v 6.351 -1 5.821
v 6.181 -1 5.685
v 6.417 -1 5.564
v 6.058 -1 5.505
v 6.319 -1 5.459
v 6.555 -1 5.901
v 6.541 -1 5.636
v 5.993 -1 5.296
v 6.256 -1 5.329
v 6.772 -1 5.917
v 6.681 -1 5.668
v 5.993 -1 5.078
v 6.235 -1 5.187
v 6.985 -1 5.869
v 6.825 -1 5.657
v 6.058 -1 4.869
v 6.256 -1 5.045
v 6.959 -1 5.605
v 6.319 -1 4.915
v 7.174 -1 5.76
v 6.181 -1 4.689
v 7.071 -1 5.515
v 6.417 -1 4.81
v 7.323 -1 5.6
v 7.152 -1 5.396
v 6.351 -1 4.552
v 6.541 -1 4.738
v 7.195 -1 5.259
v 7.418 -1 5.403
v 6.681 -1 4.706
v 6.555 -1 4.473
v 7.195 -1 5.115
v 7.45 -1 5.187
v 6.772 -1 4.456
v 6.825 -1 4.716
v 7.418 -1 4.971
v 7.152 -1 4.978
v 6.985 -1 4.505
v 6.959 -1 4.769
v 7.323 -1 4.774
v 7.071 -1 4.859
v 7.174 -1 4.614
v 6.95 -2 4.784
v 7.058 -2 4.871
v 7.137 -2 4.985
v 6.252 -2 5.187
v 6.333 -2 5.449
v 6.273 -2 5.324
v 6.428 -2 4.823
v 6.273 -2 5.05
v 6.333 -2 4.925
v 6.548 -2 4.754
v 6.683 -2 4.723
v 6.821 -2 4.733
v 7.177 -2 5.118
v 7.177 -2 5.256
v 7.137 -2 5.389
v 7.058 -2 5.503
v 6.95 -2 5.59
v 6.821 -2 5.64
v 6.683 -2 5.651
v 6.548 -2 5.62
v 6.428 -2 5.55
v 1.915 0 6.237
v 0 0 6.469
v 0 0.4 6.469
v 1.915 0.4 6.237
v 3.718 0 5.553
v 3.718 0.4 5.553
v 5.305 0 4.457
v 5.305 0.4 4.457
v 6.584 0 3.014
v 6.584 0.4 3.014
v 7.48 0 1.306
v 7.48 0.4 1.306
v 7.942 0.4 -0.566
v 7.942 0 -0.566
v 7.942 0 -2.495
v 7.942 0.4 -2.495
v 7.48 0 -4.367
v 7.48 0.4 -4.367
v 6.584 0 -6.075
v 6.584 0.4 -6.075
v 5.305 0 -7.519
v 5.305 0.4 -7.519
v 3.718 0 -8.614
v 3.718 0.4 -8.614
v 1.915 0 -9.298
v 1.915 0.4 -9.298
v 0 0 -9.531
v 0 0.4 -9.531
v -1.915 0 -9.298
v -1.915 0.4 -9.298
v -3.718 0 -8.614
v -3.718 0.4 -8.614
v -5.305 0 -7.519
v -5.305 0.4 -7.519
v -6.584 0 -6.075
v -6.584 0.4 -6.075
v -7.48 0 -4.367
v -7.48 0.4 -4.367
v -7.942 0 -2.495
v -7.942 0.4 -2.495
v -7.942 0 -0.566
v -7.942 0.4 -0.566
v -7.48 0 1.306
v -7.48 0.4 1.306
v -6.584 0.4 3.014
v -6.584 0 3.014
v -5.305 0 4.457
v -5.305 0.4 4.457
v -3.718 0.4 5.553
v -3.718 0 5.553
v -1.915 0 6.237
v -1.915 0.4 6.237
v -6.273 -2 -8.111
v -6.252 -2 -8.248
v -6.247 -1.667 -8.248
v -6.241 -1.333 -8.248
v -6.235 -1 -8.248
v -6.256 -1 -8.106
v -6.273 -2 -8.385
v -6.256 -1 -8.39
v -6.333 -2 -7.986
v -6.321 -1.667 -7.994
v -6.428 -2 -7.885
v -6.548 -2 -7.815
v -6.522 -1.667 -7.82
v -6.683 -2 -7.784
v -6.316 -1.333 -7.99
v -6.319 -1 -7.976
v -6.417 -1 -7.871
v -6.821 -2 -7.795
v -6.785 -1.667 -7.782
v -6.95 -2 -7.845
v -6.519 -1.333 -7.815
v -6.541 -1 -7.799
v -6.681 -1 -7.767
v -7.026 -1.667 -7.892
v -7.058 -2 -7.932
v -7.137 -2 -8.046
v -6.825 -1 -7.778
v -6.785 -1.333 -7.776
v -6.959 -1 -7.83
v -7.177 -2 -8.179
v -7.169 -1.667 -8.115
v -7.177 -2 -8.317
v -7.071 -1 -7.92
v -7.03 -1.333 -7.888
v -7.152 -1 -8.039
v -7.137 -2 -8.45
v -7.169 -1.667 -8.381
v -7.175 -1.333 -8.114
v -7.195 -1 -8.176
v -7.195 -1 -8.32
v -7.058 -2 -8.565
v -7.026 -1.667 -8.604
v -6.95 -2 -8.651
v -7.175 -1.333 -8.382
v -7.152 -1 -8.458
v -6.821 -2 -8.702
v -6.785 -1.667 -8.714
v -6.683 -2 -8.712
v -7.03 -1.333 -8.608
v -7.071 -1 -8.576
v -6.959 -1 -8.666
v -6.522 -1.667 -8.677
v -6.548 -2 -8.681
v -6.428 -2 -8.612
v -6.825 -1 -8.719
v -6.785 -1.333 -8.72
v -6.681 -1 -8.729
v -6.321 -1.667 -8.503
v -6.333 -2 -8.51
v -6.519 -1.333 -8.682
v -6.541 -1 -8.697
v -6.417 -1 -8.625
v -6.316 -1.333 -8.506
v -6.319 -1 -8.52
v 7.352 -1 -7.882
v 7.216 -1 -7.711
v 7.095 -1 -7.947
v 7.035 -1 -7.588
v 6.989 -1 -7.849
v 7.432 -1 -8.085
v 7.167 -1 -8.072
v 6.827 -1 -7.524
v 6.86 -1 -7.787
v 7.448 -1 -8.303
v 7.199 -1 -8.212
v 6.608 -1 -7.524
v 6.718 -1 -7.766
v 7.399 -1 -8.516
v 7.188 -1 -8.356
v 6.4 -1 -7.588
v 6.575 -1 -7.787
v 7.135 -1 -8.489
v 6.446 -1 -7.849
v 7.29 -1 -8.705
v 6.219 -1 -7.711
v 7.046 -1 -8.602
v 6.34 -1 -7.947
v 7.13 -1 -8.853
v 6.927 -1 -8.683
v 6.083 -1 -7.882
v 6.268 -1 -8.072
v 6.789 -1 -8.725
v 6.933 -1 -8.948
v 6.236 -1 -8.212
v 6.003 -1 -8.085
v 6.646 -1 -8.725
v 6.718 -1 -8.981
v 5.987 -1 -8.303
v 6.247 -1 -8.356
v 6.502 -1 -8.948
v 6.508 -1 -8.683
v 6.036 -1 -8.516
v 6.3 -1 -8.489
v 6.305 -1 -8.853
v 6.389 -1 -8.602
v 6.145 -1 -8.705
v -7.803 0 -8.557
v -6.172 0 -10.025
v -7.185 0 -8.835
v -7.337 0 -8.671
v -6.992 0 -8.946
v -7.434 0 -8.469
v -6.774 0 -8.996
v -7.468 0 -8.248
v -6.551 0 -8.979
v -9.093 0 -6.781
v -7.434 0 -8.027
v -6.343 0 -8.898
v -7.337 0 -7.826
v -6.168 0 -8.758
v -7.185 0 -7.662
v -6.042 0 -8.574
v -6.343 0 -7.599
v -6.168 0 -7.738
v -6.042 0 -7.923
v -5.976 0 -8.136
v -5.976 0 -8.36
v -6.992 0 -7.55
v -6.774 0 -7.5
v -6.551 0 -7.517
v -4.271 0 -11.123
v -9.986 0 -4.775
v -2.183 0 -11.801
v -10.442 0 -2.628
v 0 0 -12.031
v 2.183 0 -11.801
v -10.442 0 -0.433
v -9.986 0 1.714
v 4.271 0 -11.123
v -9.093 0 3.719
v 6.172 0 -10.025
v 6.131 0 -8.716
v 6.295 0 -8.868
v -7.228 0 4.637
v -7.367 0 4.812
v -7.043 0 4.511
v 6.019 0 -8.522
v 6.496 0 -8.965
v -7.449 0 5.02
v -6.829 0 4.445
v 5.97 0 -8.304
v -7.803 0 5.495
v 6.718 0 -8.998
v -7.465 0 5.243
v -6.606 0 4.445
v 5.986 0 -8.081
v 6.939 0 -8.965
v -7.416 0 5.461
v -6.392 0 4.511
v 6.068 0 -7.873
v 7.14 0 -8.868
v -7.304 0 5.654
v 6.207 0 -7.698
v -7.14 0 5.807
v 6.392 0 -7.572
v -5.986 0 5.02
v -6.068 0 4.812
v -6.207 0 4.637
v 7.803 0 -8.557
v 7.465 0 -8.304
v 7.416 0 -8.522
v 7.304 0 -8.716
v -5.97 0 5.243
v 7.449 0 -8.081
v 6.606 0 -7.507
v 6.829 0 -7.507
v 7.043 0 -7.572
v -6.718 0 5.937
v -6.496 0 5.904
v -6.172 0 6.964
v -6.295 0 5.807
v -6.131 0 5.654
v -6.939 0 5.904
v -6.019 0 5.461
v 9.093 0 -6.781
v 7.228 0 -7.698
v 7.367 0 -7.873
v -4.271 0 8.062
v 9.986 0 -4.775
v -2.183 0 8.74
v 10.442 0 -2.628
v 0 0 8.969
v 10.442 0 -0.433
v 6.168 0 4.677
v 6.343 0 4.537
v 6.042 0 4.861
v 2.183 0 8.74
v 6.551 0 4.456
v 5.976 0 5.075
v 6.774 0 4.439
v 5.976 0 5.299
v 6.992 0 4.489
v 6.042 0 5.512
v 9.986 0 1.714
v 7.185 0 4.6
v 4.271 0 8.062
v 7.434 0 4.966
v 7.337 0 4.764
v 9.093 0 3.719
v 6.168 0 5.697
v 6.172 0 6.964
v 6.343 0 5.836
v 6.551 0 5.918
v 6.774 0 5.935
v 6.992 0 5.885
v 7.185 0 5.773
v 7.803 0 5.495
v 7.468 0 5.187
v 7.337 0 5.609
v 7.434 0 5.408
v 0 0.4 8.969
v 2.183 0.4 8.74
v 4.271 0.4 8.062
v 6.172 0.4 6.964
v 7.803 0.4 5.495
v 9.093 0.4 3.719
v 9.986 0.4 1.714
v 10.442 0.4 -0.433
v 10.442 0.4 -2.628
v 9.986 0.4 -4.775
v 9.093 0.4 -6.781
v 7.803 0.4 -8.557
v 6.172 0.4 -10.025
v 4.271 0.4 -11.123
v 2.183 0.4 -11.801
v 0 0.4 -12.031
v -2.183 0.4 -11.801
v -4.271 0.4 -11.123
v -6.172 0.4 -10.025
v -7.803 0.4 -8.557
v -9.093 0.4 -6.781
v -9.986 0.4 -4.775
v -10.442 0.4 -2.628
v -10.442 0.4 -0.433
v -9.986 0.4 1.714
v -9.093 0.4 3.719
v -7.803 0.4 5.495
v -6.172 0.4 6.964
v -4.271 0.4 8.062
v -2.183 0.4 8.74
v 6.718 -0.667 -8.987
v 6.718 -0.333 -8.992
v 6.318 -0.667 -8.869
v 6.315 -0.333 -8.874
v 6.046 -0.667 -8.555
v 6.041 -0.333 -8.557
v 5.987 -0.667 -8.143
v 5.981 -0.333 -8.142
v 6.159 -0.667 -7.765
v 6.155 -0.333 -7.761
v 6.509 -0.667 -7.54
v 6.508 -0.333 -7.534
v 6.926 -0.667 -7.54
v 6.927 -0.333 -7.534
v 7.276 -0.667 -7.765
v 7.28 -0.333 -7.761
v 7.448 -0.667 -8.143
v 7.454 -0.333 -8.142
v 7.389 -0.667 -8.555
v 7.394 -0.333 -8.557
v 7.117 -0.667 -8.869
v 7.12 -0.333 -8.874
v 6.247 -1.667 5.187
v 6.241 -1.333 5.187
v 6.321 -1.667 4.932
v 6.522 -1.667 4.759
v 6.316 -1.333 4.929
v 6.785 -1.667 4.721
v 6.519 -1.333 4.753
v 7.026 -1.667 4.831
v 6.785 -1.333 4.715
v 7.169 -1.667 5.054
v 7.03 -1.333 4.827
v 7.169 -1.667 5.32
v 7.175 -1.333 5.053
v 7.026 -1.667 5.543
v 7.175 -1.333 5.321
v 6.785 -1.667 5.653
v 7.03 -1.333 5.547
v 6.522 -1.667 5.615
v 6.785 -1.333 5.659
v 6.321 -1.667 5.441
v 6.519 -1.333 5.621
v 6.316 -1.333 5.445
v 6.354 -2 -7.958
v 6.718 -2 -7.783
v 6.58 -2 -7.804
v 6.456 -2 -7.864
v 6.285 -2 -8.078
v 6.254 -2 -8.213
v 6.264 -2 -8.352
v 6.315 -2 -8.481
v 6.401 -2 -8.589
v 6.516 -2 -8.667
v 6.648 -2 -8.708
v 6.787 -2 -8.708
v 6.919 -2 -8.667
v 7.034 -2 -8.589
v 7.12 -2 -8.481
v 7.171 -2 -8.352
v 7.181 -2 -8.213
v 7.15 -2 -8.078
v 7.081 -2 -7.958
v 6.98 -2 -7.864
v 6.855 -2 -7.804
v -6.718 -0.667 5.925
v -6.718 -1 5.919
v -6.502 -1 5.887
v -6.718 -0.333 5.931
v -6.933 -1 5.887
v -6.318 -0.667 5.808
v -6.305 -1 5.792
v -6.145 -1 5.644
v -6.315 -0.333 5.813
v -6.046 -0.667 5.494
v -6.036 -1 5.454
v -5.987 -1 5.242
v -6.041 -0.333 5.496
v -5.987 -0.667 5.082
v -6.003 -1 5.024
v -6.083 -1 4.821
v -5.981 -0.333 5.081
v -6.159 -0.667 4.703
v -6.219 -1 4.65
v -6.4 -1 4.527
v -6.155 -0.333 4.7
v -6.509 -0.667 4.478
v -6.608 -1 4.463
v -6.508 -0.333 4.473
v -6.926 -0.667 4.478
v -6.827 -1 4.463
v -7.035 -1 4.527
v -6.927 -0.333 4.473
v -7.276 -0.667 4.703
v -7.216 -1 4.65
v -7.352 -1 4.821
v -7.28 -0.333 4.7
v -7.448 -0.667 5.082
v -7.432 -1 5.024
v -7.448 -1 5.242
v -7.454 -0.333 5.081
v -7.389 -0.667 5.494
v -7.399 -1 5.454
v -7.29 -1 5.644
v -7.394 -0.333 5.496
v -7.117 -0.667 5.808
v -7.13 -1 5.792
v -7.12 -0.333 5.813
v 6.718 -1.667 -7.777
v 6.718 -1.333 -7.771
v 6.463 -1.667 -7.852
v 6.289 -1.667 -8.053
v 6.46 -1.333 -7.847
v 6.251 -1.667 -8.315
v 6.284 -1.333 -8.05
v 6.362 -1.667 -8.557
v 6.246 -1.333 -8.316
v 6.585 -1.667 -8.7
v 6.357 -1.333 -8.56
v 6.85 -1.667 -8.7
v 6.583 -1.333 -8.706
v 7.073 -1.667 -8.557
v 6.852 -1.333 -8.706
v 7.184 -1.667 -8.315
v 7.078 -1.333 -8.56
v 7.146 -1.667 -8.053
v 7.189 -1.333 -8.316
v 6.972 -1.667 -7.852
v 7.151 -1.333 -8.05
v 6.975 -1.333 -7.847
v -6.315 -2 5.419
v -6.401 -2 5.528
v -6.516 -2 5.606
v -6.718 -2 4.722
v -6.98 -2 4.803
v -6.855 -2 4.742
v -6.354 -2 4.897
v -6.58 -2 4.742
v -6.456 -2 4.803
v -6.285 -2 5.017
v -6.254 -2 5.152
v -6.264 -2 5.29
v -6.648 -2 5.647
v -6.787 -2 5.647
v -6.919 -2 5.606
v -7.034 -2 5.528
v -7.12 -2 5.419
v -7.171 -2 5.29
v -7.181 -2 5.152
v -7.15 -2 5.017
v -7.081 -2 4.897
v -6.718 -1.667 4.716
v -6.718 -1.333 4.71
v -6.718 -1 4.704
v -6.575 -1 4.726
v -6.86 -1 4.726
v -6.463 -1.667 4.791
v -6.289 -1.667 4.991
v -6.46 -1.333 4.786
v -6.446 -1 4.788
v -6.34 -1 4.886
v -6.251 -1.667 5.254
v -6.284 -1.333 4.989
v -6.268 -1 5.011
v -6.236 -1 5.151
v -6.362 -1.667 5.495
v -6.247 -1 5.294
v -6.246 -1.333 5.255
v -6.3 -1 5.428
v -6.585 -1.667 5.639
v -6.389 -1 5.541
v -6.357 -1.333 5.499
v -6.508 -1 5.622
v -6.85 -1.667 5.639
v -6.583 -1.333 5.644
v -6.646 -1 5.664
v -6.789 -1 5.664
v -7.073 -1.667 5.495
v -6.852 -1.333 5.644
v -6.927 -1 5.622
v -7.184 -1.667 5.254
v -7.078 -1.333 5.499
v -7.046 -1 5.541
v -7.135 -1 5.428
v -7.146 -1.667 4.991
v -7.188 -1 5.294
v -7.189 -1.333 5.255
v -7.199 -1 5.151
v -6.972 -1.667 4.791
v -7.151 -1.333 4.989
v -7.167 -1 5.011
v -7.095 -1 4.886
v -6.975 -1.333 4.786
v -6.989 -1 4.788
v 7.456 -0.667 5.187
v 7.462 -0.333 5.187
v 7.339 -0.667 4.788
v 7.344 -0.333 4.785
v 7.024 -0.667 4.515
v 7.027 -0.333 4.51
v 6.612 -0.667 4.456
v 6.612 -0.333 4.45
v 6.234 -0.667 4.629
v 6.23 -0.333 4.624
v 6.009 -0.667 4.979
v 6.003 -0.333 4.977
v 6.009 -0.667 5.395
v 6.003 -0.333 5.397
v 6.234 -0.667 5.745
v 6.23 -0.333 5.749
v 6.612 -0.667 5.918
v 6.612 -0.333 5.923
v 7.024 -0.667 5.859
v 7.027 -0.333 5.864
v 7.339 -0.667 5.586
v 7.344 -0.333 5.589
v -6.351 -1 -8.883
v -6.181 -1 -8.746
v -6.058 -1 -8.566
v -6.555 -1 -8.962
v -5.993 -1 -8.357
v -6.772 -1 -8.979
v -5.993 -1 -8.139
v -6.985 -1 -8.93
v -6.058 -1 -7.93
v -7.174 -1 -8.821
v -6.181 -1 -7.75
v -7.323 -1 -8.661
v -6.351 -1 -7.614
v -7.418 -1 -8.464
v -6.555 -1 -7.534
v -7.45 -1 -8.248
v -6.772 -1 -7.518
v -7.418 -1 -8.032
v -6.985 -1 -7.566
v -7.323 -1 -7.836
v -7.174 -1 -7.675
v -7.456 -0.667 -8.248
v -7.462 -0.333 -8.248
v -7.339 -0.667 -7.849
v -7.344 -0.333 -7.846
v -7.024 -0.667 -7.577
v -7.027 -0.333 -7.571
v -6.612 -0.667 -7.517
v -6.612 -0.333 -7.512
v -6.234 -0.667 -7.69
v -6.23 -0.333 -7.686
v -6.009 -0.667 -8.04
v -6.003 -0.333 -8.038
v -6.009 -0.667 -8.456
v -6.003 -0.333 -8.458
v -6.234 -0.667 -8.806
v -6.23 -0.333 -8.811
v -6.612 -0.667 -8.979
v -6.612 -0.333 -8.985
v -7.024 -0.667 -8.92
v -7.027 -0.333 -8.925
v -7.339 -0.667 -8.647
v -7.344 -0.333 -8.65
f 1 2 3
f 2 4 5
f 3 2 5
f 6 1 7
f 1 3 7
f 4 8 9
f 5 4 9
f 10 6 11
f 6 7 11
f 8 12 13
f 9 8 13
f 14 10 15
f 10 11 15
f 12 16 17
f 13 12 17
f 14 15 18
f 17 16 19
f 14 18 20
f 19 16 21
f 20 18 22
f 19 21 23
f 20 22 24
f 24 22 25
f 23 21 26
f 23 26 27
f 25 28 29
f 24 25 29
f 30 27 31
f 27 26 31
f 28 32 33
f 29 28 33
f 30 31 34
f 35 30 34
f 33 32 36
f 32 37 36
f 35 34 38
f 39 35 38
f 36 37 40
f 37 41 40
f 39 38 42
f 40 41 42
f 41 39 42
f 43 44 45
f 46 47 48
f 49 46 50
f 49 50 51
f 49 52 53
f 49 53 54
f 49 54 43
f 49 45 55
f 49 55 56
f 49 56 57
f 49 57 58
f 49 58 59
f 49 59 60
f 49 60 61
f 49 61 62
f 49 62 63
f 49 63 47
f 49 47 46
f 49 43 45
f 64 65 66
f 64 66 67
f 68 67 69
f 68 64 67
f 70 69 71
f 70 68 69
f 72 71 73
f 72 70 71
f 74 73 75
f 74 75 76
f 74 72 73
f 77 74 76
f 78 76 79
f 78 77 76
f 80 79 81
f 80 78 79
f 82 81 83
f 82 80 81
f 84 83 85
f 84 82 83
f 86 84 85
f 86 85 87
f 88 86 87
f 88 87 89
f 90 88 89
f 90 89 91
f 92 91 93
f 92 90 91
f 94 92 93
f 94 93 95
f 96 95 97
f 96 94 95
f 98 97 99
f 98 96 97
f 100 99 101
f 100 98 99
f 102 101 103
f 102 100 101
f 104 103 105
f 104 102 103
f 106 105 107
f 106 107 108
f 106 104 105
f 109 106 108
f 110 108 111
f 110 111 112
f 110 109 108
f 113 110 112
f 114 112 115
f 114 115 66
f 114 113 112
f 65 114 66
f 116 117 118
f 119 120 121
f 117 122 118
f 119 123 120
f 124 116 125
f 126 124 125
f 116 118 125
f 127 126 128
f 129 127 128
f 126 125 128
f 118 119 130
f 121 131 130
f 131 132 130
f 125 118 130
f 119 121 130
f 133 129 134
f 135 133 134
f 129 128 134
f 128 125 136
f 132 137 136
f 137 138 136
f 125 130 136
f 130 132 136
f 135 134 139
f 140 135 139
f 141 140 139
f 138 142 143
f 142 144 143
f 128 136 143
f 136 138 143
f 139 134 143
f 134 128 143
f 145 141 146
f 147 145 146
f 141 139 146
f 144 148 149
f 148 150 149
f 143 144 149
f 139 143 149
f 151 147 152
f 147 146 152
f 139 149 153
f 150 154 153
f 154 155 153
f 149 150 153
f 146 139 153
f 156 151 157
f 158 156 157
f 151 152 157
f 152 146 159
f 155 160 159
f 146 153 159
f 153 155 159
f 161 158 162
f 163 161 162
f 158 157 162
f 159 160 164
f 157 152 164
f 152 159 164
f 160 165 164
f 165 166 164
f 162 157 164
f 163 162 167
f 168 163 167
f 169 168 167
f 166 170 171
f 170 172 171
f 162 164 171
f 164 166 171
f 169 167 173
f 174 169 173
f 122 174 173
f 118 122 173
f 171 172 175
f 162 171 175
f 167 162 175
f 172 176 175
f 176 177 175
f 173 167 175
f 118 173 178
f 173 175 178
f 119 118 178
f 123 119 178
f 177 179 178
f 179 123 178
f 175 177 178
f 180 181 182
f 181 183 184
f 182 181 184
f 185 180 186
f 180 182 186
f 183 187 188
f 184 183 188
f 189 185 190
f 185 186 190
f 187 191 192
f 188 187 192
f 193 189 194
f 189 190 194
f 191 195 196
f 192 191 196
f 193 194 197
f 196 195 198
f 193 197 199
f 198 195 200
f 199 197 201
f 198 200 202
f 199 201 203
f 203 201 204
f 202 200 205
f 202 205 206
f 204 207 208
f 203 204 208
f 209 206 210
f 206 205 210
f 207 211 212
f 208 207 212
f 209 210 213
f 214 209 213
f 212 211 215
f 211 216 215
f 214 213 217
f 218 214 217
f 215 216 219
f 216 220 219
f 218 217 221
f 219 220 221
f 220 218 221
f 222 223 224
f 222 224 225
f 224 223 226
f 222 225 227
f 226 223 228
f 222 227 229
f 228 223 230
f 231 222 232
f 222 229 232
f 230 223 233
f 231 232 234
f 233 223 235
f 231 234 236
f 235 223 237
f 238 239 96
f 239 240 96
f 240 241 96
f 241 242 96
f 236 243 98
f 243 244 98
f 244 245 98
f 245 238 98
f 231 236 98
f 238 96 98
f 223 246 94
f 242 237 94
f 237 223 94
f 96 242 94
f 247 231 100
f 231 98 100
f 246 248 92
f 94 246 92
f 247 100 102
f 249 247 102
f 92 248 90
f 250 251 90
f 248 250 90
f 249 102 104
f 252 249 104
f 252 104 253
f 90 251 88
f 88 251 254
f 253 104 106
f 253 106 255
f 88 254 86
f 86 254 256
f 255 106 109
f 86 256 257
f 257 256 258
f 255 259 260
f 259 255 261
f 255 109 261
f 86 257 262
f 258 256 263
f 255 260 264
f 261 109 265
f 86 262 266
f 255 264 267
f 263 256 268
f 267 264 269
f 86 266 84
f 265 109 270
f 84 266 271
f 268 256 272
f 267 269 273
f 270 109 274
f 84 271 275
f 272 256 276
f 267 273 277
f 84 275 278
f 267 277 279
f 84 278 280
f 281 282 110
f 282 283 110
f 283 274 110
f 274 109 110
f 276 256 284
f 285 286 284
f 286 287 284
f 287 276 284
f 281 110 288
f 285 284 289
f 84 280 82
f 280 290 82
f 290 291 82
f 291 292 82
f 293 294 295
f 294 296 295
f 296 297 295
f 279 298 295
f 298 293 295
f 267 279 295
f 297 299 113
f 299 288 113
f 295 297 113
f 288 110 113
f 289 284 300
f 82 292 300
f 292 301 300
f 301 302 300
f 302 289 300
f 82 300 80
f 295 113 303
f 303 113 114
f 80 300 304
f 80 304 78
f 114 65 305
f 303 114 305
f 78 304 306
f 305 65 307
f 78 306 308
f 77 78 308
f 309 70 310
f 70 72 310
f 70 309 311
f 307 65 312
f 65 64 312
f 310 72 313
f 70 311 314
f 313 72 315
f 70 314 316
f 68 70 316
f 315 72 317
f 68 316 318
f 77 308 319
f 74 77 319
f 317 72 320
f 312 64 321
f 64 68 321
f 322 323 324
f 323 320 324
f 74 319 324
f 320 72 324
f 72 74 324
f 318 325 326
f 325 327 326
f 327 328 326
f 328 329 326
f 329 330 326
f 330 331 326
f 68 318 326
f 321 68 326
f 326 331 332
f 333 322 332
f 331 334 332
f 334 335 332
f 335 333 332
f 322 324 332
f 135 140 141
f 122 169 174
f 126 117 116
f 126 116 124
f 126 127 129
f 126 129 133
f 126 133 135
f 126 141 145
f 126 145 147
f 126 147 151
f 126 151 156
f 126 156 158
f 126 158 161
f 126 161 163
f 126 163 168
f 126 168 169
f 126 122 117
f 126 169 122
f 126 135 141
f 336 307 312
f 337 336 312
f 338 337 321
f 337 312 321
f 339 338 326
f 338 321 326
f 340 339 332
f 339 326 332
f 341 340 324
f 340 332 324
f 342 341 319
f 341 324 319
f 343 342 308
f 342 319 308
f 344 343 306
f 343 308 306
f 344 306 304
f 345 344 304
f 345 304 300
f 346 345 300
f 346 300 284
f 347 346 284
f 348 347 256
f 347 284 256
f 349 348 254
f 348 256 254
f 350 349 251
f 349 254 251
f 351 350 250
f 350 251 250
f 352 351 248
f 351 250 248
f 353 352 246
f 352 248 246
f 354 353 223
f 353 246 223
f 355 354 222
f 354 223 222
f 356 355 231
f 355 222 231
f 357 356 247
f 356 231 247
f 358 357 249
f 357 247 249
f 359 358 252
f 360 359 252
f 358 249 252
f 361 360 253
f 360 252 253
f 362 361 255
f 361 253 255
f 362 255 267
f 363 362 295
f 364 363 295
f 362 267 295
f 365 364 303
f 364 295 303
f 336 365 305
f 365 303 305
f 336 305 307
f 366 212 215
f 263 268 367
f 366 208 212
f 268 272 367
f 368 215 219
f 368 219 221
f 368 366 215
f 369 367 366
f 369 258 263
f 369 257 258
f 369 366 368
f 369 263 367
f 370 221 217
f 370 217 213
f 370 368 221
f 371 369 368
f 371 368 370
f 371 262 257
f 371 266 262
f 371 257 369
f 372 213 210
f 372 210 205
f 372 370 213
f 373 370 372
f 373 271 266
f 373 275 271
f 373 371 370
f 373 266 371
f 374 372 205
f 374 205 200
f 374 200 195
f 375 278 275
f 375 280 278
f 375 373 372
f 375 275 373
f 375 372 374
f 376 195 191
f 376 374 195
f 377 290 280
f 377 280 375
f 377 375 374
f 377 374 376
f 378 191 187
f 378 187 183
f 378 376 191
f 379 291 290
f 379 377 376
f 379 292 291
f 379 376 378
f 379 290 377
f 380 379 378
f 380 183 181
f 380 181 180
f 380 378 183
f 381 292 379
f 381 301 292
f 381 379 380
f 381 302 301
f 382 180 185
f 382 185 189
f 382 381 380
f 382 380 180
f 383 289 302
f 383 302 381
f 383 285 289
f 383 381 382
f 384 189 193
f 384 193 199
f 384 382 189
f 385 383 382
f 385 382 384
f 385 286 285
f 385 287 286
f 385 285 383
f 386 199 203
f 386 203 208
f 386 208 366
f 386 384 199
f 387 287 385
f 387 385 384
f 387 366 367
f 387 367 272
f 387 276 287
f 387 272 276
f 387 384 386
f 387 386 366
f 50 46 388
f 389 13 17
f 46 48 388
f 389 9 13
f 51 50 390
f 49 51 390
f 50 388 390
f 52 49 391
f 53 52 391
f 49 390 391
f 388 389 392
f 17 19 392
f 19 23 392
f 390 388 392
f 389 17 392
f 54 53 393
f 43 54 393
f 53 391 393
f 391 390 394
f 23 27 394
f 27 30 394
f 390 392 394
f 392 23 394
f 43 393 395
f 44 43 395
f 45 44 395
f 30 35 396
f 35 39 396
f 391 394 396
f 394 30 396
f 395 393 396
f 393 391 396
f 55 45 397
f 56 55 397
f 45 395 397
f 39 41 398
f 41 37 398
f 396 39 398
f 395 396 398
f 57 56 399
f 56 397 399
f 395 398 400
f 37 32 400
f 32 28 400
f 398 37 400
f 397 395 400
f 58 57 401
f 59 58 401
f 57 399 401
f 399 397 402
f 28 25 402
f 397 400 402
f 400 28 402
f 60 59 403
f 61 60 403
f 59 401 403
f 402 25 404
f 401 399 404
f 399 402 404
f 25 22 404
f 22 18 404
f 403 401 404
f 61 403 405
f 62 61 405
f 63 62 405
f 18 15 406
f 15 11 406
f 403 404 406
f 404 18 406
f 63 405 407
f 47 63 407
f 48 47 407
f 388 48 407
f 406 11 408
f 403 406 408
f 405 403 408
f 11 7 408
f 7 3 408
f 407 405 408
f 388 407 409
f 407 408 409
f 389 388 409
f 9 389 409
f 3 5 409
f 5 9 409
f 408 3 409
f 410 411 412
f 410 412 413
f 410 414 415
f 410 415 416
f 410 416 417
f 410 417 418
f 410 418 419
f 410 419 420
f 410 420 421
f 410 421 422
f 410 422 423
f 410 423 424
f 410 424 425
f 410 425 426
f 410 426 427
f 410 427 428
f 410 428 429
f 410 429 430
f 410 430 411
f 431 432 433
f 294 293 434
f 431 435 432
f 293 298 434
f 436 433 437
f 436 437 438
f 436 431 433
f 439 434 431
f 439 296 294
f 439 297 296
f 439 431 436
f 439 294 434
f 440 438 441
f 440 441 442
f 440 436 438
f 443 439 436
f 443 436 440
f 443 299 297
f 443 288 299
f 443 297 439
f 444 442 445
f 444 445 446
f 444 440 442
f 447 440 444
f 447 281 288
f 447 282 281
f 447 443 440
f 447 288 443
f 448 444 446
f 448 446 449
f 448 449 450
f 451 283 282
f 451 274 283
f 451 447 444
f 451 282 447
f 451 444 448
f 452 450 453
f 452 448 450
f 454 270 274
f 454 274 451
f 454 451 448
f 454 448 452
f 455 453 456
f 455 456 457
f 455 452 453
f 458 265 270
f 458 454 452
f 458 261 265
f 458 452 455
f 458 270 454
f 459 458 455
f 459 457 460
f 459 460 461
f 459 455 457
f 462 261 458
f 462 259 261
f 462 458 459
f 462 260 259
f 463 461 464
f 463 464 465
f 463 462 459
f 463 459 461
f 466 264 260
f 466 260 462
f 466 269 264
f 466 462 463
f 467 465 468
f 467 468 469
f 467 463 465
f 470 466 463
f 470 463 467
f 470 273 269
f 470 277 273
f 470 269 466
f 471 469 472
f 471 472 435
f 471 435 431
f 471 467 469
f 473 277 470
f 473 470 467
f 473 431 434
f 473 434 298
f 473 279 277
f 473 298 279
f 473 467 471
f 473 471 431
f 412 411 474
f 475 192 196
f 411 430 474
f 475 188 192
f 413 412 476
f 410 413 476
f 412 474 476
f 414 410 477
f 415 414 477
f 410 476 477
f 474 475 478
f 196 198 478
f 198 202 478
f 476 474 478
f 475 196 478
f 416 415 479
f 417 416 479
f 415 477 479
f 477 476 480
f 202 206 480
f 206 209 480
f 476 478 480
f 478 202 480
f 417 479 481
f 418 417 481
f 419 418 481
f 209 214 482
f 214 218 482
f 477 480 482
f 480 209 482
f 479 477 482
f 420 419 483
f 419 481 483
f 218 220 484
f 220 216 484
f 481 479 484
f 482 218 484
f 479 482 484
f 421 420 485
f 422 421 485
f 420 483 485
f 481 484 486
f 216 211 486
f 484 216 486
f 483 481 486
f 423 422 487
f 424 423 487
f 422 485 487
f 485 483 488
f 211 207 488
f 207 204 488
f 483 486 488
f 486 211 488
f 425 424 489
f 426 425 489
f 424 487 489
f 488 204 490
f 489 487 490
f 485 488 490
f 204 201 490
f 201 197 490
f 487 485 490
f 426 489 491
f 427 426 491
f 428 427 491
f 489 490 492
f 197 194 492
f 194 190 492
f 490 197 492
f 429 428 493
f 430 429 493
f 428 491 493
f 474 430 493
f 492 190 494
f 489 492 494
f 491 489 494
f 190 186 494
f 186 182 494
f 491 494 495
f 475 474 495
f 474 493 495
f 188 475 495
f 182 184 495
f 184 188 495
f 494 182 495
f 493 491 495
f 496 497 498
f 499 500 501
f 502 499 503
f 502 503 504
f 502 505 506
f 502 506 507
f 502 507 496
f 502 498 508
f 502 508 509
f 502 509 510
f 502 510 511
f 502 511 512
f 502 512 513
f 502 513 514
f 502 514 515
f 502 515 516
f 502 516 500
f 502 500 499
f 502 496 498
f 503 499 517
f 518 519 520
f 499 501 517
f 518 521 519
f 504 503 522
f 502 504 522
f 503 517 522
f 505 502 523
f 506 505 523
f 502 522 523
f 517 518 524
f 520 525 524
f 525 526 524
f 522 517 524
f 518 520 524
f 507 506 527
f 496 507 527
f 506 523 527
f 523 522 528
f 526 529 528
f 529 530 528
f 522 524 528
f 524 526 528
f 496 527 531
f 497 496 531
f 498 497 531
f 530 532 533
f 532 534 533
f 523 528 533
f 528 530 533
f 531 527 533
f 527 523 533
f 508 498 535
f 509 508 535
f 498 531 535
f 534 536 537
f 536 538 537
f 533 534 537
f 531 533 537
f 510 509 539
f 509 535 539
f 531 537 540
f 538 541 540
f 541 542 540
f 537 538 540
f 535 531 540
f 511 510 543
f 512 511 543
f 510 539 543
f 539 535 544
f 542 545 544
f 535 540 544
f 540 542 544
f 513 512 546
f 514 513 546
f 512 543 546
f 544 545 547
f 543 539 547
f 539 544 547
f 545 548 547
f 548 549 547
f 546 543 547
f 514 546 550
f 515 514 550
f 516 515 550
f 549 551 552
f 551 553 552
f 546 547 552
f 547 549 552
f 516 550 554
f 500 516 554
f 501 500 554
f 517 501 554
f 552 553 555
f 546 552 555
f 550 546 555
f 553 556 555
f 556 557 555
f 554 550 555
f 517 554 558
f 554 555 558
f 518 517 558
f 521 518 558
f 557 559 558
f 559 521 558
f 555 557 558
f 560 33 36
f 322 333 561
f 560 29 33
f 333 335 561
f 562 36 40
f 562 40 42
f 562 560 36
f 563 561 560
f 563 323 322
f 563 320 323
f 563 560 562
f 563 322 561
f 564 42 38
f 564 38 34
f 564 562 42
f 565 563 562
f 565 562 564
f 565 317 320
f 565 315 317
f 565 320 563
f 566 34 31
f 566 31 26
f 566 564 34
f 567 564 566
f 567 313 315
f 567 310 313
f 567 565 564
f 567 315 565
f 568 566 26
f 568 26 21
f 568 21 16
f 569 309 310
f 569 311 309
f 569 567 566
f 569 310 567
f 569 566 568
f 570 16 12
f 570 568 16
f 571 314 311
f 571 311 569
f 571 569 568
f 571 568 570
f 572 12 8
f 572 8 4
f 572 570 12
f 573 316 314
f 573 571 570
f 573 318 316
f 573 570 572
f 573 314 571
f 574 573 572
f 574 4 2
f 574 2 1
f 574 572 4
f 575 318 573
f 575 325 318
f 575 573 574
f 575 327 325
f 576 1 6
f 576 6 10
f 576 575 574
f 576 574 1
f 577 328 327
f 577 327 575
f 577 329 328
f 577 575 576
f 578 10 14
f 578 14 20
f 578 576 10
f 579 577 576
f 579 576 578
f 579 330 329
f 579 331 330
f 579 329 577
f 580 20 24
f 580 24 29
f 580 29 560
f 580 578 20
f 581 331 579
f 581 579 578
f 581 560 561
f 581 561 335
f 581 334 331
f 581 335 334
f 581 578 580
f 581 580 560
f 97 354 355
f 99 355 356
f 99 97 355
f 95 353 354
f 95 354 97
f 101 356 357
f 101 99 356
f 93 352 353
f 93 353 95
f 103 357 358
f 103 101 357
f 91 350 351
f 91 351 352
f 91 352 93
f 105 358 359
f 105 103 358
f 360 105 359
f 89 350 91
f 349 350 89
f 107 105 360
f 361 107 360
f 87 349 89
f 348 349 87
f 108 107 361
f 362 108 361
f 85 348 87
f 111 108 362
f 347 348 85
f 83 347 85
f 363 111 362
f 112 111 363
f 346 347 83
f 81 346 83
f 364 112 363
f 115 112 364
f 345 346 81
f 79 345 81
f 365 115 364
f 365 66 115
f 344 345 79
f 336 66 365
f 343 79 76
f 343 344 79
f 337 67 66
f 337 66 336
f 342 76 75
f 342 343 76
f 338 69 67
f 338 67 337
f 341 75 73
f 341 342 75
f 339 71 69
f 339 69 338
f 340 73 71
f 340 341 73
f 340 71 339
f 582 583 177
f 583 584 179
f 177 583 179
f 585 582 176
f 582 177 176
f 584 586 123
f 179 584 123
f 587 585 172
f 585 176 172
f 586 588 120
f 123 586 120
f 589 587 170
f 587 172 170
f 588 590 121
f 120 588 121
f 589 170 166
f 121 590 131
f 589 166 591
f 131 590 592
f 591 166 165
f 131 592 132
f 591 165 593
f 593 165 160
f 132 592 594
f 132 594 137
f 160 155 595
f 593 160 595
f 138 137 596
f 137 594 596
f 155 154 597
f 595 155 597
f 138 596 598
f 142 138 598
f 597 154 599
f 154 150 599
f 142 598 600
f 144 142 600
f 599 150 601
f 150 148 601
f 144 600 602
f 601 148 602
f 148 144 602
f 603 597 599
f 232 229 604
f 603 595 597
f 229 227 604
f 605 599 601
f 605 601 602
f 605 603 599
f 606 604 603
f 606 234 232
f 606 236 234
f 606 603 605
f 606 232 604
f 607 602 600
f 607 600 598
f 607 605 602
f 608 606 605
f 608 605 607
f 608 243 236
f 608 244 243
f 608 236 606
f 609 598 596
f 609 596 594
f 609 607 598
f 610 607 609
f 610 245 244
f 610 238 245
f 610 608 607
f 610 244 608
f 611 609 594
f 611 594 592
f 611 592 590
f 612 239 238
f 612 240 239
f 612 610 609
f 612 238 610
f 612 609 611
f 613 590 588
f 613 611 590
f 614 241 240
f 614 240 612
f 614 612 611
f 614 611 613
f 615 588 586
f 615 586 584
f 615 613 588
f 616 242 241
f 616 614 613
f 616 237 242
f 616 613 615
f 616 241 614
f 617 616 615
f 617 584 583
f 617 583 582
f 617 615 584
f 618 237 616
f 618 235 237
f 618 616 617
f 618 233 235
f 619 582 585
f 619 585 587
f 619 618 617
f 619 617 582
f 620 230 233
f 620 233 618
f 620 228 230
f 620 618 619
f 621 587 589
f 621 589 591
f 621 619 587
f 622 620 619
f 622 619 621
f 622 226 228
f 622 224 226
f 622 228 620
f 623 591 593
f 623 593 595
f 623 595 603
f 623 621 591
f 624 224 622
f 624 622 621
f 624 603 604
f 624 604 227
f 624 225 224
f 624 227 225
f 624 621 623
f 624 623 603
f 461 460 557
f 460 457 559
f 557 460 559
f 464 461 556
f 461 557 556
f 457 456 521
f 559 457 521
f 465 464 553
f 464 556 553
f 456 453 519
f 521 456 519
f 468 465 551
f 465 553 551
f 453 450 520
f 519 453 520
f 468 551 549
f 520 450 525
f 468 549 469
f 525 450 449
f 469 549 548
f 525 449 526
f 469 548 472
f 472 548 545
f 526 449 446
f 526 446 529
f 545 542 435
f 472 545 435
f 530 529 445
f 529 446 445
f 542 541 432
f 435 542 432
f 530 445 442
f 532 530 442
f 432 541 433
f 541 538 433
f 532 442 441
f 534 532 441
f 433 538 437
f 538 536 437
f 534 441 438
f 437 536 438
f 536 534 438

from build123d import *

# Parameters (mm, degrees)
SKETCH1_R           = 10.5
SKETCH1_R_2         = 8
BOSS_EXTRUDE1_DEPTH = 0.4
SKETCH2_R           = 0.75
BOSS_EXTRUDE2_DEPTH = 1
SKETCH3_R           = 0.5
BOSS_EXTRUDE3_DEPTH = 1
CIRPATTERN1_COUNT   = 4
DRAFT1_ANGLE        = 1


with BuildPart() as part:
    # Sketch1 → Boss-Extrude1 (new body)
    with BuildSketch(Plane(origin=(0, 0, 0), x_dir=(1, 0, 0), z_dir=(0, 1, 0))):
        with Locations(Location((0, 1.53064501, 0), (0, 0, 270))):
            Circle(SKETCH1_R)
        with Locations(Location((0, 1.53064501, 0), (0, 0, 270))):
            Circle(SKETCH1_R_2, mode=Mode.SUBTRACT)
    extrude(amount=BOSS_EXTRUDE1_DEPTH)

    # Sketch2 → Boss-Extrude2 (add)
    with BuildSketch(Plane(origin=(0, 0, 0), x_dir=(1, 0, 0), z_dir=(0, 1, 0))):
        with Locations(Location((-6.717514421, -5.186869411, 0), (0, 0, 270))):
            Circle(SKETCH2_R)
    boss_extrude2 = extrude(amount=-BOSS_EXTRUDE2_DEPTH)

    # Sketch3 → Boss-Extrude3 (add)
    with BuildSketch(Plane.XZ.offset(1)):
        with Locations(Location((-6.717514421, 5.186869411, 0), (0, 0, 270))):
            Circle(SKETCH3_R)
    boss_extrude3 = extrude(amount=BOSS_EXTRUDE3_DEPTH)

    # CirPattern1: Boss-Extrude2, Boss-Extrude3 ×4 about axis
    cirpattern1_axis = Axis((0, 0, -1.53064501), (0, 1, 0))
    add([boss_extrude2.rotate(cirpattern1_axis, i * 360 / CIRPATTERN1_COUNT) for i in range(1, CIRPATTERN1_COUNT)])
    add([boss_extrude3.rotate(cirpattern1_axis, i * 360 / CIRPATTERN1_COUNT) for i in range(1, CIRPATTERN1_COUNT)])

    # Draft1
    draft1_faces = [part.faces().sort_by_distance(p)[0] for p in [
        (5.967514421, -0.5, 5.186869411),
        (7.217514421, -1.5, 5.186869411),
        (6.717514421, -0.5, -7.498159431),
        (6.717514421, -1.5, -8.748159431),
        (-5.967514421, -0.5, -8.248159431),
        (-7.217514421, -1.5, -8.248159431),
        (-6.717514421, -0.5, 4.436869411),
        (-6.717514421, -1.5, 5.686869411),
    ]]
    draft(draft1_faces, Plane(origin=(0, 0, -1.53064501), x_dir=(0, 0, -1), z_dir=(0, -1, 0)), DRAFT1_ANGLE)


solid = part.part
